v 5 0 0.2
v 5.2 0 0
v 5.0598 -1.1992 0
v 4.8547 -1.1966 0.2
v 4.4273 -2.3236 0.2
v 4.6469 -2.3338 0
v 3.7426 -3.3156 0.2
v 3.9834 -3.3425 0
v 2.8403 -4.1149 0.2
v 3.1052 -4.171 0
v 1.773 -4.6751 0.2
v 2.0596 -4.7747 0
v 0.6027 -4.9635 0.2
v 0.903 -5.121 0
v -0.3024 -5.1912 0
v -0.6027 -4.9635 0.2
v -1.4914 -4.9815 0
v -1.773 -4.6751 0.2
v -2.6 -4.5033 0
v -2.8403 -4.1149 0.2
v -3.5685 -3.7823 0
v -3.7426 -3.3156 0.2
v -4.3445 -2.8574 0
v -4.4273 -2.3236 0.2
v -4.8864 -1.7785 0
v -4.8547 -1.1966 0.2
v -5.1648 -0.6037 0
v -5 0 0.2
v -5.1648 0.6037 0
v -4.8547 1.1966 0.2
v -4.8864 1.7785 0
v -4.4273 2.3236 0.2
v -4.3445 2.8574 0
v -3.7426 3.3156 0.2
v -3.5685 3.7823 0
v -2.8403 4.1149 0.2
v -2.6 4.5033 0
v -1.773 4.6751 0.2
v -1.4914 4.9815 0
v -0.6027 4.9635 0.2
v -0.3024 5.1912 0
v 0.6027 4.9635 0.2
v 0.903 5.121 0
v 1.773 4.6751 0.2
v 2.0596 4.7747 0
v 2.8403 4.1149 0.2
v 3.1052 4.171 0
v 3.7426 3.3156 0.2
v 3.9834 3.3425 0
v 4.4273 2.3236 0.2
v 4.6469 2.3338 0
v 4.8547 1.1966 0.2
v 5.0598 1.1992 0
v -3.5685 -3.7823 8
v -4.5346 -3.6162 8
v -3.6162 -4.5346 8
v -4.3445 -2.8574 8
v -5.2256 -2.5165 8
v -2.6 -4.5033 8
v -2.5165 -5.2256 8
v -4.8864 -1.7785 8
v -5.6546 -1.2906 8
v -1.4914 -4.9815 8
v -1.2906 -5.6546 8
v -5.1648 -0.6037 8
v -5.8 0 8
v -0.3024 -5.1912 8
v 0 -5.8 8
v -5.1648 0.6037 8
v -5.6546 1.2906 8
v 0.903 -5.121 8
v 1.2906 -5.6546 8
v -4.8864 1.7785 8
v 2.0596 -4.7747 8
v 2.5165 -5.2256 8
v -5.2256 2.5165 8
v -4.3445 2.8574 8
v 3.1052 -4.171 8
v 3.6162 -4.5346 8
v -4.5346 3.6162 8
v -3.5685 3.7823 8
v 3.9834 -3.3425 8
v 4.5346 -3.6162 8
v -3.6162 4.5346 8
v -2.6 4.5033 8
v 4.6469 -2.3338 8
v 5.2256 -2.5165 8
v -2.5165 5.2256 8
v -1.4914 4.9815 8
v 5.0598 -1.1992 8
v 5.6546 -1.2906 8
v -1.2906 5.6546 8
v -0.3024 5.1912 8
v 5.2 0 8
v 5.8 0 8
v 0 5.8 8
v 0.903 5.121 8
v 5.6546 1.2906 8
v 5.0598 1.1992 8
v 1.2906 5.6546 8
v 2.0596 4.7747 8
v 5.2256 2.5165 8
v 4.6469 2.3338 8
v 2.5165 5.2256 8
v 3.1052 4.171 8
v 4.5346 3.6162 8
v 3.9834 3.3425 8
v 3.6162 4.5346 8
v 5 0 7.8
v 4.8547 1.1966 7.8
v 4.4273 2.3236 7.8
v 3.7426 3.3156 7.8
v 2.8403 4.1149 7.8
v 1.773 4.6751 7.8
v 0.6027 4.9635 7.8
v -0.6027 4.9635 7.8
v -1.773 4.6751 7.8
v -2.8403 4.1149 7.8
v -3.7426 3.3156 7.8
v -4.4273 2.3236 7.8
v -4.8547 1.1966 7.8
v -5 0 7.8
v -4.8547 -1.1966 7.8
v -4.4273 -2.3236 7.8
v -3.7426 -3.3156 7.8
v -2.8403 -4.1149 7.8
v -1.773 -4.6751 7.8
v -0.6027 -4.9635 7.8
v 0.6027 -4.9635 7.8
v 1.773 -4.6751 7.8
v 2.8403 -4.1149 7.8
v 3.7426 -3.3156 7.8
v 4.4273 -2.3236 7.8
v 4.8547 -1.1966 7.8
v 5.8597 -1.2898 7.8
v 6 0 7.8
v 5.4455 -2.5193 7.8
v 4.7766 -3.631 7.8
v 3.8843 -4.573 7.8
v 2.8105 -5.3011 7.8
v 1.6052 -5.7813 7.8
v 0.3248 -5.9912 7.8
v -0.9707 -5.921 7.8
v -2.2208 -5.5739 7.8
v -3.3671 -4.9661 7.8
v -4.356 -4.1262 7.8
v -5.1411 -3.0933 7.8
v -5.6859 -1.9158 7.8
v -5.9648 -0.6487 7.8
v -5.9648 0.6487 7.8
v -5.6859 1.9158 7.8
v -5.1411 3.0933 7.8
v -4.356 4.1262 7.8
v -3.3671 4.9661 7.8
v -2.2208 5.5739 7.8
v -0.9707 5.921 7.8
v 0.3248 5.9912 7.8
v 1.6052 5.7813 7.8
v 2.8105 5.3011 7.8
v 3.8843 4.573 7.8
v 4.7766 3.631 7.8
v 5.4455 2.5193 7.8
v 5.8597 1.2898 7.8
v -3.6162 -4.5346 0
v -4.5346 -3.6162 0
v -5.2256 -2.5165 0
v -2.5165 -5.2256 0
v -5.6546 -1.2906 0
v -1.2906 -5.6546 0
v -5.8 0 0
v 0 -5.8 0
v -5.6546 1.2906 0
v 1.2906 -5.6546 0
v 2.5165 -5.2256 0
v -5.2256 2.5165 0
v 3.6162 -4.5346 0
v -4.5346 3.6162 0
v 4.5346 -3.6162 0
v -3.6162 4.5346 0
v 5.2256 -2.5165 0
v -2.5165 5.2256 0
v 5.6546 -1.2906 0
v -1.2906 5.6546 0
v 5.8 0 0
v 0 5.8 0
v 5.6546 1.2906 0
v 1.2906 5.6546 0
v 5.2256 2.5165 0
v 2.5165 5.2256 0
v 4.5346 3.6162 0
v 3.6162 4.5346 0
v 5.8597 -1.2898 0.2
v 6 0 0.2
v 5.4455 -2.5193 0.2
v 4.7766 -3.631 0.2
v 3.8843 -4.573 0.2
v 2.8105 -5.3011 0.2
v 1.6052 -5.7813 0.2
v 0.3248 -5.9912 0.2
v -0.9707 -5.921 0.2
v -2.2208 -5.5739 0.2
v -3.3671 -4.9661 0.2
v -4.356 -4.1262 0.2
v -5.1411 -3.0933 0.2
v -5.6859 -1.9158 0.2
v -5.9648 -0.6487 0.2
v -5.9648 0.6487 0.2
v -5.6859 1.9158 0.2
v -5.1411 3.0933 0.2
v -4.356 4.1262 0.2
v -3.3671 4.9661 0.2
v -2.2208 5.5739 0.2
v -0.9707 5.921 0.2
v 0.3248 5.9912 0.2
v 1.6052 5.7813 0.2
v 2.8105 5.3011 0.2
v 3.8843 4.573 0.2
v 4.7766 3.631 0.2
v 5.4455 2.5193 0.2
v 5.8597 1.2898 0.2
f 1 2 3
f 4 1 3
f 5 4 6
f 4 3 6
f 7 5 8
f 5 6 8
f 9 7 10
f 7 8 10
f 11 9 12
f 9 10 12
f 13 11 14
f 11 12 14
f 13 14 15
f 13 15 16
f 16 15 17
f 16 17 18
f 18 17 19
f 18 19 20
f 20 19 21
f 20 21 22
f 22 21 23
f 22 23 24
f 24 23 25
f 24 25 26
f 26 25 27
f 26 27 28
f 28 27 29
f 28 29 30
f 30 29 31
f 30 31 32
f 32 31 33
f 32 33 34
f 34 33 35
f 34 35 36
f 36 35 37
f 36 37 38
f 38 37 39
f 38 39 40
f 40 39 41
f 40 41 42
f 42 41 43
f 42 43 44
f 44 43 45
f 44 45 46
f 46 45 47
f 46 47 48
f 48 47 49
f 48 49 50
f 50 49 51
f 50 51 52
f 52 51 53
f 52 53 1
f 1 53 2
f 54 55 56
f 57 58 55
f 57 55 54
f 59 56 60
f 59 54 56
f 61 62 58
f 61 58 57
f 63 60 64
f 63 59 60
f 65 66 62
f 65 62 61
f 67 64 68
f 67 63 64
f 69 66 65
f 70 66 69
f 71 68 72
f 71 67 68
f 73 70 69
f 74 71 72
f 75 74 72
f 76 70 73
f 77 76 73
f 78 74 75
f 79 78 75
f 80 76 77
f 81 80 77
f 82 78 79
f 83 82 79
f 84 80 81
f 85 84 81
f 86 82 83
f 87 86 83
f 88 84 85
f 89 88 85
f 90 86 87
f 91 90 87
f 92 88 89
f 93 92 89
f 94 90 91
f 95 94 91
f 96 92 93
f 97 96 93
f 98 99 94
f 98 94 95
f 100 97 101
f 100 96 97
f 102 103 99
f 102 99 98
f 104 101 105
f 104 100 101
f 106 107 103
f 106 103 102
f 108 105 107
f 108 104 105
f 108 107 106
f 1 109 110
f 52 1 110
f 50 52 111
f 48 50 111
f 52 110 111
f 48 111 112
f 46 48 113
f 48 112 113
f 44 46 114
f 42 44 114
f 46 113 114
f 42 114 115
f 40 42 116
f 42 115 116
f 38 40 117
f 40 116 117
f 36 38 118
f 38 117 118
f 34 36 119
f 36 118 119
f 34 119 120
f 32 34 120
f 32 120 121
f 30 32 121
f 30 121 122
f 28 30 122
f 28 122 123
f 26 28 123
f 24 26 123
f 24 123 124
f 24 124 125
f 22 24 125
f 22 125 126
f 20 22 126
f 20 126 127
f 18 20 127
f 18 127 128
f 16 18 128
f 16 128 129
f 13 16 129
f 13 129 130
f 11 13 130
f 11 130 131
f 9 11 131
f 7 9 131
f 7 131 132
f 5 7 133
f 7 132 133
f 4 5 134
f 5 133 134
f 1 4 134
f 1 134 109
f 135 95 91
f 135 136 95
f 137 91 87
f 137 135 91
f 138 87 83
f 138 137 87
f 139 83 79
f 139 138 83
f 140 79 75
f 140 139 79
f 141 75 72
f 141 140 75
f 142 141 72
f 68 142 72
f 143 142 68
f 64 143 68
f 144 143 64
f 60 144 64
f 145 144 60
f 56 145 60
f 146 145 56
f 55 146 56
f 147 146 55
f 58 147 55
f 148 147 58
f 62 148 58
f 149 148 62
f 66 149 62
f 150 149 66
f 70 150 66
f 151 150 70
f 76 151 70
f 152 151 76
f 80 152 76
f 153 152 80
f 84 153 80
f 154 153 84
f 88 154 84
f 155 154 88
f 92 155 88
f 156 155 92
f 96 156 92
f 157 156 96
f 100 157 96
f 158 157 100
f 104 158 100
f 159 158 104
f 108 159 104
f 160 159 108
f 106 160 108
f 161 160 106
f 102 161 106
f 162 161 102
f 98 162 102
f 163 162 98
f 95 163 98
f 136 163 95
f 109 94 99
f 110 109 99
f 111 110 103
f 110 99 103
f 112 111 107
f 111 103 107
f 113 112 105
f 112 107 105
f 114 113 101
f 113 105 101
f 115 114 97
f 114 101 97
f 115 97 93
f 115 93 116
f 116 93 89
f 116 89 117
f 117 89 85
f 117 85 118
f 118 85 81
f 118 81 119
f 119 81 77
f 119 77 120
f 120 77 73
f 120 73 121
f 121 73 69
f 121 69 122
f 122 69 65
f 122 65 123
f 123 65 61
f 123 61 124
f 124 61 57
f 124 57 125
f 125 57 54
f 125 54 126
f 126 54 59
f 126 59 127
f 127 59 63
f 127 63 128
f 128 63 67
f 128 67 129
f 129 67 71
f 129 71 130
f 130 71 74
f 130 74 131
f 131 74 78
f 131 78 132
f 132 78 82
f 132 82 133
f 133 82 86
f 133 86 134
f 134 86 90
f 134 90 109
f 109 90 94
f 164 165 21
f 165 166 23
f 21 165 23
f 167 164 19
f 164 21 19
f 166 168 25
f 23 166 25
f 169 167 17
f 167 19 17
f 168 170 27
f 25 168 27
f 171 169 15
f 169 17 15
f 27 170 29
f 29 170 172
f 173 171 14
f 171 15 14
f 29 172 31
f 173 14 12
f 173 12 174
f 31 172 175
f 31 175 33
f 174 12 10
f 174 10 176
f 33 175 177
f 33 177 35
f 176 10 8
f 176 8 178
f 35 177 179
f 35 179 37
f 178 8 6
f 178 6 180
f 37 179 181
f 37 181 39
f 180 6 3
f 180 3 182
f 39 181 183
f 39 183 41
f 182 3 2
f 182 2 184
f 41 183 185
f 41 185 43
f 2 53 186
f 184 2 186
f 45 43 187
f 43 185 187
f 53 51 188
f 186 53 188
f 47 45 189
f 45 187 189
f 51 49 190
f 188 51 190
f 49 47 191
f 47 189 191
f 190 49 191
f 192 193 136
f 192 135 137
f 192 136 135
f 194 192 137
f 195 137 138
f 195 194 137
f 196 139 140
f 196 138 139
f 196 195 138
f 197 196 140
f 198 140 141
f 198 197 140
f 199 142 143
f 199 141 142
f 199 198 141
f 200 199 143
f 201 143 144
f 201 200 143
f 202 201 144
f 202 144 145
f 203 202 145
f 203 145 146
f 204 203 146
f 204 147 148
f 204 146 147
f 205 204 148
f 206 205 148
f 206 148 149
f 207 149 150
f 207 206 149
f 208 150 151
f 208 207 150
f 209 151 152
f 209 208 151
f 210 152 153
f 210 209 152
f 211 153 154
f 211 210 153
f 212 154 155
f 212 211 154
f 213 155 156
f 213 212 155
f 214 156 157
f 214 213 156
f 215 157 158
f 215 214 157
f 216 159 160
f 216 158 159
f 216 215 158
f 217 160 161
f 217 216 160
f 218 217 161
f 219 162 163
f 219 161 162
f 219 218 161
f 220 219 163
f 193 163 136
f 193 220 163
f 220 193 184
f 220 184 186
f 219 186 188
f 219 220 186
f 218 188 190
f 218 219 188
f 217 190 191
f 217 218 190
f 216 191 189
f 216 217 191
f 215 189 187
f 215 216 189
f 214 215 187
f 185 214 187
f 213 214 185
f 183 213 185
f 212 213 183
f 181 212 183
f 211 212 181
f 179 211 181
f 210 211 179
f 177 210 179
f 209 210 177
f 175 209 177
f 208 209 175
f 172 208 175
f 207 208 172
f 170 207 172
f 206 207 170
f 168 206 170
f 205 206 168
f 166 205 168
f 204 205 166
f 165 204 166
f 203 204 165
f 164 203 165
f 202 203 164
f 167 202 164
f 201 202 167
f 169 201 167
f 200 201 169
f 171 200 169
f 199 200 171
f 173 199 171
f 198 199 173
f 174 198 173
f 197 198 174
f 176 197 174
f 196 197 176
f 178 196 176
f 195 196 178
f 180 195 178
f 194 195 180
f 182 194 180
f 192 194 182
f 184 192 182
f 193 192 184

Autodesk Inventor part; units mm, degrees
ref_plane "YZ Plane" through (0, 0, 0) normal (1, 0, 0) x (0, 1, 0)
ref_plane "XZ Plane" through (0, 0, 0) normal (0, 1, 0) x (-1, 0, 0)
ref_plane "XY Plane" through (0, 0, 0) normal (0, 0, 1) x (1, 0, 0)
sketch "スケッチ1" plane through (0, 0, 0) normal (0, 1, 0) x (-1, 0, 0)
  line L0 (-5.2, 8) -> (-5.8, 8)
  line L1 (-6, 7.8) -> (-6, 0.2)
  line L2 (-5.8, 0) -> (-5.2, 0)
  line L3 (-5, 0.2) -> (-5, 7.8)
  line L4 (-5, 8) -> (-6, 0) construction
  line L5 (-6, 8) -> (-5, 0) construction
  line L6 (0, -1.6) -> (0, 9.6) projected
  line L7 (-5.8, 8) -> (-6, 7.8)
  line L8 (-6, 0.2) -> (-5.8, 0)
  line L9 (-5.2, 0) -> (-5, 0.2)
  line L10 (-5, 7.8) -> (-5.2, 8)
  point P0 (0, 0)
  point P1 (-5.5, 4)
  dimension "d0" = 10
  dimension "d1" = 12
  dimension "d2" = 8
  dimension "d3" = 0.2
  dimension "d4" = 0.2
  dimension "d5" = 0.2
  dimension "d6" = 0.2
  dimension "d7" = 0.2
  dimension "d8" = 0.2
  dimension "d9" = 0.2
  dimension "d10" = 0.2
revolve "回転1" add sketch "スケッチ1" angle 360 about axis through (0, 0, -10) along (0, 0, 1)
equation "\"d4\" = d3"
equation "\"d5\" = d3"
equation "\"d6\" = d5"
equation "\"d7\" = d3"
equation "\"d8\" = d7"
equation "\"d9\" = d3"
equation "\"d10\" = d9"
properties part number "WSSS-12-10-8" material "ステンレス鋼 AISI 304"
